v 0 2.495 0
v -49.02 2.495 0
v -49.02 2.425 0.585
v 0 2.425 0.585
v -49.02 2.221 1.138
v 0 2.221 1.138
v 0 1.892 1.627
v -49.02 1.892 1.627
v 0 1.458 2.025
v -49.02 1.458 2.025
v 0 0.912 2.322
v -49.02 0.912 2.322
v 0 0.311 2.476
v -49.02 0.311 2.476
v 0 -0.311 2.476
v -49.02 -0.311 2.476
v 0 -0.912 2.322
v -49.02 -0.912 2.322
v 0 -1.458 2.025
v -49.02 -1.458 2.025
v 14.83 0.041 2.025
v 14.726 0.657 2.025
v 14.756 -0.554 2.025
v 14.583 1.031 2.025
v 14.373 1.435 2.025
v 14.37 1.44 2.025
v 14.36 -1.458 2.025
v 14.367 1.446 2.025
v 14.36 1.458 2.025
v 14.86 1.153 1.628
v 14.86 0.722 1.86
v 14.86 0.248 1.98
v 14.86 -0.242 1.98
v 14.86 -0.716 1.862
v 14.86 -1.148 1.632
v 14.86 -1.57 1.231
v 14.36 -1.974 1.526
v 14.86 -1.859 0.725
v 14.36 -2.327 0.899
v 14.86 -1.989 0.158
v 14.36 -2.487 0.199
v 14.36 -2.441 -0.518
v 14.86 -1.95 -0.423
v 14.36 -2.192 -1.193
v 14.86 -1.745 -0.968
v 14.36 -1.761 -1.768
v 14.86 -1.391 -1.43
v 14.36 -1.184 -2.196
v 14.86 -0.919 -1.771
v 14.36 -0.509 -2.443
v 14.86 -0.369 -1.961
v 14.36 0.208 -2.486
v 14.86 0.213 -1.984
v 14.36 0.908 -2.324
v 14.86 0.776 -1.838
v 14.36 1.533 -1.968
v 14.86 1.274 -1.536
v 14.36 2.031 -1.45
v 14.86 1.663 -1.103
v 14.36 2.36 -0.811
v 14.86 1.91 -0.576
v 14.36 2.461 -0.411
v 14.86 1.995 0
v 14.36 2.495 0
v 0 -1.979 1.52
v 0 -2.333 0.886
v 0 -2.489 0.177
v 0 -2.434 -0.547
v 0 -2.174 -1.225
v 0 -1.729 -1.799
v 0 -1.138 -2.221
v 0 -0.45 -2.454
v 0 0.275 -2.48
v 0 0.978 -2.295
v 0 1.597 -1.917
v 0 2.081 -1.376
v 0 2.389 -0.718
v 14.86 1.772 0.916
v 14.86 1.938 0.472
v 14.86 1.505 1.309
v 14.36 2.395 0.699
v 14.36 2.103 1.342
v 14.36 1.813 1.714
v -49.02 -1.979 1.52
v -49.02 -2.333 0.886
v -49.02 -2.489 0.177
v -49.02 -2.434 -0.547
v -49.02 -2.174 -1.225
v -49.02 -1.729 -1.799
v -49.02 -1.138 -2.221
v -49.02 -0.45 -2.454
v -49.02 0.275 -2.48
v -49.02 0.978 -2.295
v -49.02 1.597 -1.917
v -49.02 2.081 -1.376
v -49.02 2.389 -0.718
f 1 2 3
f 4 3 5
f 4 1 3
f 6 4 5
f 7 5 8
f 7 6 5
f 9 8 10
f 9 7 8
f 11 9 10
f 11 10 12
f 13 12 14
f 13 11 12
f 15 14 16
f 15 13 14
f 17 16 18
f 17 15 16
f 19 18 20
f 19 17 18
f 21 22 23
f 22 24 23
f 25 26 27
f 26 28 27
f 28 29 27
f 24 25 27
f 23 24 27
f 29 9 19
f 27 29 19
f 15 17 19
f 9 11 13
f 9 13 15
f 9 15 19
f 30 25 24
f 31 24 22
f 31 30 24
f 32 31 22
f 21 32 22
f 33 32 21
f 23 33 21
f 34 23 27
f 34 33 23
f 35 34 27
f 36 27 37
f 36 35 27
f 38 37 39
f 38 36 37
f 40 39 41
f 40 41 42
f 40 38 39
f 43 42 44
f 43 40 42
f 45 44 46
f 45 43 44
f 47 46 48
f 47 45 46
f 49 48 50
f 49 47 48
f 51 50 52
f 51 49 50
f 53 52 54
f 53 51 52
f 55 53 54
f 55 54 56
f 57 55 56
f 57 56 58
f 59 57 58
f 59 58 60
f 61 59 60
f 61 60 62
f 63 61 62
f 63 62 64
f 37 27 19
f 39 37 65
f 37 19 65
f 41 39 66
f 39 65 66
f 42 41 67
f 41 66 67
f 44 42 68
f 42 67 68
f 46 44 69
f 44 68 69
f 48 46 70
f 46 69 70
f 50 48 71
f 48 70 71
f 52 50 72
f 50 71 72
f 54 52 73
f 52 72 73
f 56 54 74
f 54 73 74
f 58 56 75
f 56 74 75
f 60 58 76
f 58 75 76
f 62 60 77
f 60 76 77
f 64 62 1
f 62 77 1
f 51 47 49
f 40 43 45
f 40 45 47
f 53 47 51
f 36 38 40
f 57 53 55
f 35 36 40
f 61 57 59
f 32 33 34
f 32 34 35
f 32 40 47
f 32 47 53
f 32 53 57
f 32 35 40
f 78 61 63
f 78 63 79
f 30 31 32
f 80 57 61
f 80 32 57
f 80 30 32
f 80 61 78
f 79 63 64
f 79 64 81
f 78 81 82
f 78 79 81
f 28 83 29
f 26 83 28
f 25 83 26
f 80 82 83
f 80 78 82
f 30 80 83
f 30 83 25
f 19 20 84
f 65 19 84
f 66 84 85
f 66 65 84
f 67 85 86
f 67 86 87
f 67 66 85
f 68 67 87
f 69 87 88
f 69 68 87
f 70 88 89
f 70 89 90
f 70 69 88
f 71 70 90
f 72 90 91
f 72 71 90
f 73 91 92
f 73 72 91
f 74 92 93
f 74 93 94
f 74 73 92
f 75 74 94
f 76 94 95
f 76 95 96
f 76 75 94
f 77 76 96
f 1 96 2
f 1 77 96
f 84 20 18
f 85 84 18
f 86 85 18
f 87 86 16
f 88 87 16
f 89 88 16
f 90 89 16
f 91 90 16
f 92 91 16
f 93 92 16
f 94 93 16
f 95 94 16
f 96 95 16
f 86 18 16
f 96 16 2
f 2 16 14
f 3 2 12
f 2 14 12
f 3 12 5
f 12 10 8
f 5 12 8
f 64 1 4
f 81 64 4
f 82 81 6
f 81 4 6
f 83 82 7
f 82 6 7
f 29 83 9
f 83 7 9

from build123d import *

# Parameters (mm, degrees)
F1_DEPTH    = 49.02
F2_DEPTH    = 14.86
F3_T2_ANGLE = 305.3161054709
F3_T4_ANGLE = 125.133270501


# Not quite as in the source:
# - a fillet or chamfer that OpenCascade refuses, or shapes differently, is made with other operations: its cross-section is extruded or revolved along the edge and cut away or added


with BuildPart() as f1:
    # F0 (on Right) → F1 (new body)
    with BuildSketch(Plane.YZ):
        with BuildLine():
            ThreePointArc((-1.4575321609, 2.025), (-1.1376471902, -2.2205368429), (2.495, 0))
            ThreePointArc((2.495, 0), (2.2205368429, 1.1376471902), (1.4575321609, 2.025))
            Line((1.4575321609, 2.025), (-1.4575321609, 2.025))
        make_face()
        with BuildLine():
            Line((-1.4575321609, 2.025), (1.4575321609, 2.025))
            ThreePointArc((1.4575321609, 2.025), (0, 2.495), (-1.4575321609, 2.025))
        make_face()
    extrude(amount=-F1_DEPTH)

    # F0 (on Right) → F2 (join)
    with BuildSketch(Plane.YZ):
        with BuildLine():
            ThreePointArc((-1.4575321609, 2.025), (-1.1376471902, -2.2205368429), (2.495, 0))
            ThreePointArc((2.495, 0), (2.2205368429, 1.1376471902), (1.4575321609, 2.025))
            Line((1.4575321609, 2.025), (-1.4575321609, 2.025))
        make_face()
    extrude(amount=F2_DEPTH)

    # F3: chamfer of 0.5 on 2 edges, made by hand

    # F3_s1 → F3_t2 (revolve, cut)
    with BuildSketch(Plane(origin=(0, 0, 0), x_dir=(1, 0, 0), z_dir=(0, 0.8159751258, -0.5780870125))):
        with BuildLine():
            Line((14.3458578644, -2.5091421356), (14.8741421356, -1.9808578644))
            Line((14.8741421356, -1.9808578644), (14.8841421356, -1.9808578644))
            ThreePointArc((14.8841421356, -1.9808578644), (14.87, -2.2379289322), (14.87, -2.495))
            Line((14.87, -2.495), (14.86, -2.505))
            ThreePointArc((14.86, -2.505), (14.6029289322, -2.505), (14.3458578644, -2.5191421356))
            Line((14.3458578644, -2.5191421356), (14.3458578644, -2.5091421356))
        make_face()
    revolve(axis=Axis((14.86, 0, 0), (1, 0, 0)), revolution_arc=F3_T2_ANGLE, mode=Mode.SUBTRACT)

    # F3_s3 → F3_t4 (revolve, cut)
    with BuildSketch(Plane.XY):
        with BuildLine():
            Line((14.3458578644, 2.5091421356), (14.8741421356, 1.9808578644))
            Line((14.8741421356, 1.9808578644), (14.8841421356, 1.9808578644))
            ThreePointArc((14.8841421356, 1.9808578644), (14.87, 2.2379289322), (14.87, 2.495))
            Line((14.87, 2.495), (14.86, 2.505))
            ThreePointArc((14.86, 2.505), (14.6029289322, 2.505), (14.3458578644, 2.5191421356))
            Line((14.3458578644, 2.5191421356), (14.3458578644, 2.5091421356))
        make_face()
    revolve(axis=Axis((14.86, 0, 0), (1, 0, 0)), revolution_arc=F3_T4_ANGLE, mode=Mode.SUBTRACT)


solid = f1.part
